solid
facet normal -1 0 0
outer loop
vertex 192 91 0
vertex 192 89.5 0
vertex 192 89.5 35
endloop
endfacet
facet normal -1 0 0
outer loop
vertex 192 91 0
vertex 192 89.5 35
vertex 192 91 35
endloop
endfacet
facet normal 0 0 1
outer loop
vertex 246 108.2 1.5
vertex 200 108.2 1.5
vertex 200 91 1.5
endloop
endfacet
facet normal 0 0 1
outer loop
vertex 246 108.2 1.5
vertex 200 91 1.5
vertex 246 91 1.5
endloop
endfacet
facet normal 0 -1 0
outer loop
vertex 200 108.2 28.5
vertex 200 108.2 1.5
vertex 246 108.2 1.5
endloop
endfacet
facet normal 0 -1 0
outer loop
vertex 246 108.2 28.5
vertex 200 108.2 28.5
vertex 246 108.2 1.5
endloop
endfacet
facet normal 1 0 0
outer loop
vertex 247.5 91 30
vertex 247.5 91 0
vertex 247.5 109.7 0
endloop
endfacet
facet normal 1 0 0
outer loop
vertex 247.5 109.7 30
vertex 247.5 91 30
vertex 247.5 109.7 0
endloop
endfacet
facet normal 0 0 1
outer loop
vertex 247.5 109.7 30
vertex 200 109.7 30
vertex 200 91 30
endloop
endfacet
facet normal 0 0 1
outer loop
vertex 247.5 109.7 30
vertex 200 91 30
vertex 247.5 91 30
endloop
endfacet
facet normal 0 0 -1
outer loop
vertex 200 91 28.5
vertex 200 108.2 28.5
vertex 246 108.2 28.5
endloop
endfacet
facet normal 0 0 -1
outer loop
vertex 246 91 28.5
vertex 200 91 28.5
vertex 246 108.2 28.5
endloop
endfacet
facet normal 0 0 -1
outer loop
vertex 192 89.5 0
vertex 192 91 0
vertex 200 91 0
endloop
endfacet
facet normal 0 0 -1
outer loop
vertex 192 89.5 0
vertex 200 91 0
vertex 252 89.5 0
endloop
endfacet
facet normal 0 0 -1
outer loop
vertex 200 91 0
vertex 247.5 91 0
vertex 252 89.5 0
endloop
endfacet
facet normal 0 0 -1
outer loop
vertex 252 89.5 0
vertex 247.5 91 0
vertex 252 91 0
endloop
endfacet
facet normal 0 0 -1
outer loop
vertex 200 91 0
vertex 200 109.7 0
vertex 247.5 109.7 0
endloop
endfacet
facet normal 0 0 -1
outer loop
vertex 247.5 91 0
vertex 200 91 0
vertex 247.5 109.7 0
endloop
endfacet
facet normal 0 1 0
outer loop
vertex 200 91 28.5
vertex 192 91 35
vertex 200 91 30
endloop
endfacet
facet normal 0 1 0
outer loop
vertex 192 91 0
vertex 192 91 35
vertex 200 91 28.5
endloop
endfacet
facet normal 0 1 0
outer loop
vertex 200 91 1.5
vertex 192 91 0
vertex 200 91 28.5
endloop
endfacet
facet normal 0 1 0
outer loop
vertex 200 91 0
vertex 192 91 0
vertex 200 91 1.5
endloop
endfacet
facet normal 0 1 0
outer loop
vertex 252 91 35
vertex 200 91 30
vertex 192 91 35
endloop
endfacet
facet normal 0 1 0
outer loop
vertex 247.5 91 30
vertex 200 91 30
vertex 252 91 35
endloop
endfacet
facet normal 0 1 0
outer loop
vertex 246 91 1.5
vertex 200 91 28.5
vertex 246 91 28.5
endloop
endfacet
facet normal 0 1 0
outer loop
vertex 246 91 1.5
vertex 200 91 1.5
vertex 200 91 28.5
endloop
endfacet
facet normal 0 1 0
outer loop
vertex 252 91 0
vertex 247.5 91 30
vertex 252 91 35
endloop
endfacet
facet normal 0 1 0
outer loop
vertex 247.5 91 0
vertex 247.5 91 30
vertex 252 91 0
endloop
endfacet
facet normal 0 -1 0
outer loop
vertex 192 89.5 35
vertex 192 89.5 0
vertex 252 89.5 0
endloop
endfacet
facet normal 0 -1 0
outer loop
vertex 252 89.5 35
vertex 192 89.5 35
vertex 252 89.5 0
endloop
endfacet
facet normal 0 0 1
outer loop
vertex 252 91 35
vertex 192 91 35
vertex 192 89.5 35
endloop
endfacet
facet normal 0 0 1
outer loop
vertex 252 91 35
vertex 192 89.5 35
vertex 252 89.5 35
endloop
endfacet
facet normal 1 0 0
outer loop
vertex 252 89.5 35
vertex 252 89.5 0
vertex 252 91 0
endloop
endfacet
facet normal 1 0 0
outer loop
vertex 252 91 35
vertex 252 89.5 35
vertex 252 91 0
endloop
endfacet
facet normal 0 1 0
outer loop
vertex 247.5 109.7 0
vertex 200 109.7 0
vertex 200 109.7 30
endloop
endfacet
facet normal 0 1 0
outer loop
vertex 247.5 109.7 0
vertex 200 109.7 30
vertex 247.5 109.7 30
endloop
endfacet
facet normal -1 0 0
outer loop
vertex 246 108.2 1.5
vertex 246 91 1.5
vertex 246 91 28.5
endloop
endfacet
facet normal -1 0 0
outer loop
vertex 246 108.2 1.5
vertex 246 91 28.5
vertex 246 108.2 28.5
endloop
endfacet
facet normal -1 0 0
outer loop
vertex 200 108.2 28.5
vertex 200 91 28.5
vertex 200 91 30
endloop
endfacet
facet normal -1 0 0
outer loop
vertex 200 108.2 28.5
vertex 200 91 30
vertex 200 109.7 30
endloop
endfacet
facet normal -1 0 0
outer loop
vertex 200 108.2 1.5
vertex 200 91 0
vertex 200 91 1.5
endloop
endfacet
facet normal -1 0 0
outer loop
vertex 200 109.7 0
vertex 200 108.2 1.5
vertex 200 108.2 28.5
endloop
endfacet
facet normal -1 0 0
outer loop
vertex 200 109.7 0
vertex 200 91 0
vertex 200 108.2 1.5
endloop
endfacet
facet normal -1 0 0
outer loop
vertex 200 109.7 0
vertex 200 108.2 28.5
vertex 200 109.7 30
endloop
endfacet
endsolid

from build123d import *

# Parameters (mm, degrees)
BOX038_W     = 60
BOX038_H     = 1.5
BOX038_DEPTH = 35
BOX037_W     = 47.5
BOX037_H     = 17.2
BOX037_DEPTH = 27
BOX036_W     = 47.5
BOX036_H     = 18.7
BOX036_DEPTH = 30


with BuildPart() as cube038:
    # Box038 → Box038 (new body)
    with BuildSketch(Plane(origin=(192, 89.5, 0), x_dir=(1, 0, 0), z_dir=(0, 0, 1))):
        with Locations((30, 0.75)):
            Rectangle(BOX038_W, BOX038_H)
    extrude(amount=BOX038_DEPTH)


with BuildPart() as cube037:
    # Box037 → Box037 (new body)
    with BuildSketch(Plane(origin=(-1.5, 0, 60), x_dir=(1, 0, 0), z_dir=(0, 0, 1))):
        with Locations((23.75, 8.6)):
            Rectangle(BOX037_W, BOX037_H)
    extrude(amount=BOX037_DEPTH)


with BuildPart() as batteryholdertest:
    # Box036 → Box036 (new body)
    with BuildSketch(Plane.XY.offset(58.5)):
        with Locations((23.75, 9.35)):
            Rectangle(BOX036_W, BOX036_H)
    extrude(amount=BOX036_DEPTH)

    # Cut045: cut Cube037
    add(cube037.part, mode=Mode.SUBTRACT)


with BuildPart() as batteryholdertest_1:
    # Cut045 placement: moved
    add(batteryholdertest.part.moved(Location((200, 91, -58.5))))

    # Connect004: union Cube038
    add(cube038.part)


solid = batteryholdertest_1.part
